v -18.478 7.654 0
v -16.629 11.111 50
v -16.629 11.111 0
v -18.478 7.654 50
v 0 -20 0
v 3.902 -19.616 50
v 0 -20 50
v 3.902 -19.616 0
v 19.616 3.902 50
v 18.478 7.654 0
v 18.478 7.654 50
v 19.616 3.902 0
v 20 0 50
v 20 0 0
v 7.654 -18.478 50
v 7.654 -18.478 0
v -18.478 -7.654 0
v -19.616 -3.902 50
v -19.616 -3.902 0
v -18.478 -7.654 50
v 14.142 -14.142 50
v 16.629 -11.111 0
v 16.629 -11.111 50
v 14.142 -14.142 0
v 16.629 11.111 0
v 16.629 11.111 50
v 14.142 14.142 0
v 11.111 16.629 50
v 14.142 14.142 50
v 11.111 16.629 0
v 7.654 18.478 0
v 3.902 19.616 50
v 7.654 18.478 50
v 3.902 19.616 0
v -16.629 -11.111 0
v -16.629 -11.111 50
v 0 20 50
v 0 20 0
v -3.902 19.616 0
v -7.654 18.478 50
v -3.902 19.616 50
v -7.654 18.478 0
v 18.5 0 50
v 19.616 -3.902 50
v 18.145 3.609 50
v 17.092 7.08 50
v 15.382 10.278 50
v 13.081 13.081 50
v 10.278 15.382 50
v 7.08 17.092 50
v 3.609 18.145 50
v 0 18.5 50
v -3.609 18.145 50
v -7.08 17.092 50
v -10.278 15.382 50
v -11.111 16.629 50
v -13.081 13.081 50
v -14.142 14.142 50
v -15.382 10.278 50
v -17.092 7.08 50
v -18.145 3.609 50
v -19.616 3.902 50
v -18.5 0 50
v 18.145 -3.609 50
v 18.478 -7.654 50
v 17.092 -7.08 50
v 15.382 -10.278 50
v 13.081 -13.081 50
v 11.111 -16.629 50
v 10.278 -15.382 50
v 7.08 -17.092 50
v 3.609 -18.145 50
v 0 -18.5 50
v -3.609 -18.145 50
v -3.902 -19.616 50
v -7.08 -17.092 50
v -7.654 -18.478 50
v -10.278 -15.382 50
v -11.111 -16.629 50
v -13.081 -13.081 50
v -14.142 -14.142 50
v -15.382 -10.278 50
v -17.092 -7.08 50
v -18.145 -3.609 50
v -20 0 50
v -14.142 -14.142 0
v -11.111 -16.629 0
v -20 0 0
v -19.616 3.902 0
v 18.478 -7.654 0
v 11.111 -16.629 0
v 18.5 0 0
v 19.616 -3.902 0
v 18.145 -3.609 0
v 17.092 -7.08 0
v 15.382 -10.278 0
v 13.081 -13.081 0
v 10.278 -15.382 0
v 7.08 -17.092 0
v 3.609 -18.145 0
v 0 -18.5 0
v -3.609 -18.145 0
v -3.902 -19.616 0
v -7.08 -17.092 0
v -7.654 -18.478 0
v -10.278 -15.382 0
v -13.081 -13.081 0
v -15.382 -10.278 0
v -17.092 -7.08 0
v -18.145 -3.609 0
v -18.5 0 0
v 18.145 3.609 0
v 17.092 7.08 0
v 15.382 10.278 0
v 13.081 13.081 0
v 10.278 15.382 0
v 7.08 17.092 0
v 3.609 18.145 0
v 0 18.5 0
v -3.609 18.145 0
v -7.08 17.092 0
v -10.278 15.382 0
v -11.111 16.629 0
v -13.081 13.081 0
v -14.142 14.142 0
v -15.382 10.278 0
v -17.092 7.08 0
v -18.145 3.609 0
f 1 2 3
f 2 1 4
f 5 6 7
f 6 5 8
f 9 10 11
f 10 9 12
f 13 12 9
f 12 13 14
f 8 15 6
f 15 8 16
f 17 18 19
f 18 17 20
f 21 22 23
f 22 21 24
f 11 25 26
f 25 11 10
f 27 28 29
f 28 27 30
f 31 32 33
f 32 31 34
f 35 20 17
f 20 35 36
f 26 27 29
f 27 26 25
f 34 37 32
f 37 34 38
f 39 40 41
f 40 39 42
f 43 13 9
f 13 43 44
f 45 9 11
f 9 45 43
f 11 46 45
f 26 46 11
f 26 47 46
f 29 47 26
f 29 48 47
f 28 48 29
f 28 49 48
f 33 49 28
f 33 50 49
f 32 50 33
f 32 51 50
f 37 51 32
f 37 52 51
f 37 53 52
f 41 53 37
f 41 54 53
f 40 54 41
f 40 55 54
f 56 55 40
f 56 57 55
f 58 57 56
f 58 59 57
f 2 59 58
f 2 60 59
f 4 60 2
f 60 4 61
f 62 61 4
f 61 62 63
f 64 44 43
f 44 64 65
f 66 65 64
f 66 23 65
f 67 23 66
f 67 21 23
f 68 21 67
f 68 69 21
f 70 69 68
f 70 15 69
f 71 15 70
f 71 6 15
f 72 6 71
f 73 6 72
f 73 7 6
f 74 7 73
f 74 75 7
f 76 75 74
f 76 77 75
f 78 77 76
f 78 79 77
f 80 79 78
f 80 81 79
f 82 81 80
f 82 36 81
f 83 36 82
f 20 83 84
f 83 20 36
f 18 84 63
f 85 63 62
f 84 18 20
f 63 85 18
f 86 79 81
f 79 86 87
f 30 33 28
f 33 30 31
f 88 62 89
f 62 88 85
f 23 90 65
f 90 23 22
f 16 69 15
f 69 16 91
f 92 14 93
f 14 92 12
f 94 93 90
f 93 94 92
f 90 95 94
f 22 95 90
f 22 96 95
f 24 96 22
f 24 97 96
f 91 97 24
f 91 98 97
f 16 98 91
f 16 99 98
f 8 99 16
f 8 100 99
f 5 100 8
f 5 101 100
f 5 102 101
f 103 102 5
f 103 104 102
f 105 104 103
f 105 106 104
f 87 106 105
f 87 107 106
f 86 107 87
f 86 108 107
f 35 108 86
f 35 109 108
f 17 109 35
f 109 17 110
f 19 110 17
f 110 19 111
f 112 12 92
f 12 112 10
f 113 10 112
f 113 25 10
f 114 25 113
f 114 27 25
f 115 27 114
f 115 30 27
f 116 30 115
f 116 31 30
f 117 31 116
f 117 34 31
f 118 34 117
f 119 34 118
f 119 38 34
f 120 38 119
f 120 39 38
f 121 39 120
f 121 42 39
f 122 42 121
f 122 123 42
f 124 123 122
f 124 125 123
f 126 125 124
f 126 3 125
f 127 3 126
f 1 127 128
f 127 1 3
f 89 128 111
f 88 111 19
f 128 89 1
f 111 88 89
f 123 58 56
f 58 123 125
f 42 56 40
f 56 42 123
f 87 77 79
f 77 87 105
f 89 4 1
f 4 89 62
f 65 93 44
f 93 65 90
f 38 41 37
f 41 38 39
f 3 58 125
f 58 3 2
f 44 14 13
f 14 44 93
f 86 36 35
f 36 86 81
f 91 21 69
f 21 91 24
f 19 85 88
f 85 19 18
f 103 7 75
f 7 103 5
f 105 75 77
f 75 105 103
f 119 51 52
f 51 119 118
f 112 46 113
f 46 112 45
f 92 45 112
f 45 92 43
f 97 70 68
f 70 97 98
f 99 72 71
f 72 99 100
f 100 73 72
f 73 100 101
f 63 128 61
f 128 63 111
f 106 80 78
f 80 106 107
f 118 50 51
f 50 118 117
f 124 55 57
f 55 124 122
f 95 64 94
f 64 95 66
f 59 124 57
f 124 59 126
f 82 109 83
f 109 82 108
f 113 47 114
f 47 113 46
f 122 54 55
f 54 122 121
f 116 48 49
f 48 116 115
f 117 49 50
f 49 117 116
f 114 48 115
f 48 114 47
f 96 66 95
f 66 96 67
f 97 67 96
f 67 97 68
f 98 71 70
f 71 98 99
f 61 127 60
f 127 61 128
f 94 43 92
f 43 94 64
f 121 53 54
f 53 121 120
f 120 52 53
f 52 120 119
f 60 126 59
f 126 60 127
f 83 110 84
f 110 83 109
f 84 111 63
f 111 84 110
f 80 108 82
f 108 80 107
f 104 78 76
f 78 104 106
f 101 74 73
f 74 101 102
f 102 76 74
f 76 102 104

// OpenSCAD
$fn = 32;

// ----------------------------------------------------------------------
// Thin tube: 1.5 mm wall
// ----------------------------------------------------------------------

// --- parameters (mm) ---
tube_od = 40;             // outer diameter
tube_h = 50;              // height, Z
wall = 1.5;               // wall thickness

difference() {
  cylinder(h = tube_h, d = tube_od);
  translate([0, 0, -1]) cylinder(h = tube_h + 2, d = tube_od - 2 * wall);
}
